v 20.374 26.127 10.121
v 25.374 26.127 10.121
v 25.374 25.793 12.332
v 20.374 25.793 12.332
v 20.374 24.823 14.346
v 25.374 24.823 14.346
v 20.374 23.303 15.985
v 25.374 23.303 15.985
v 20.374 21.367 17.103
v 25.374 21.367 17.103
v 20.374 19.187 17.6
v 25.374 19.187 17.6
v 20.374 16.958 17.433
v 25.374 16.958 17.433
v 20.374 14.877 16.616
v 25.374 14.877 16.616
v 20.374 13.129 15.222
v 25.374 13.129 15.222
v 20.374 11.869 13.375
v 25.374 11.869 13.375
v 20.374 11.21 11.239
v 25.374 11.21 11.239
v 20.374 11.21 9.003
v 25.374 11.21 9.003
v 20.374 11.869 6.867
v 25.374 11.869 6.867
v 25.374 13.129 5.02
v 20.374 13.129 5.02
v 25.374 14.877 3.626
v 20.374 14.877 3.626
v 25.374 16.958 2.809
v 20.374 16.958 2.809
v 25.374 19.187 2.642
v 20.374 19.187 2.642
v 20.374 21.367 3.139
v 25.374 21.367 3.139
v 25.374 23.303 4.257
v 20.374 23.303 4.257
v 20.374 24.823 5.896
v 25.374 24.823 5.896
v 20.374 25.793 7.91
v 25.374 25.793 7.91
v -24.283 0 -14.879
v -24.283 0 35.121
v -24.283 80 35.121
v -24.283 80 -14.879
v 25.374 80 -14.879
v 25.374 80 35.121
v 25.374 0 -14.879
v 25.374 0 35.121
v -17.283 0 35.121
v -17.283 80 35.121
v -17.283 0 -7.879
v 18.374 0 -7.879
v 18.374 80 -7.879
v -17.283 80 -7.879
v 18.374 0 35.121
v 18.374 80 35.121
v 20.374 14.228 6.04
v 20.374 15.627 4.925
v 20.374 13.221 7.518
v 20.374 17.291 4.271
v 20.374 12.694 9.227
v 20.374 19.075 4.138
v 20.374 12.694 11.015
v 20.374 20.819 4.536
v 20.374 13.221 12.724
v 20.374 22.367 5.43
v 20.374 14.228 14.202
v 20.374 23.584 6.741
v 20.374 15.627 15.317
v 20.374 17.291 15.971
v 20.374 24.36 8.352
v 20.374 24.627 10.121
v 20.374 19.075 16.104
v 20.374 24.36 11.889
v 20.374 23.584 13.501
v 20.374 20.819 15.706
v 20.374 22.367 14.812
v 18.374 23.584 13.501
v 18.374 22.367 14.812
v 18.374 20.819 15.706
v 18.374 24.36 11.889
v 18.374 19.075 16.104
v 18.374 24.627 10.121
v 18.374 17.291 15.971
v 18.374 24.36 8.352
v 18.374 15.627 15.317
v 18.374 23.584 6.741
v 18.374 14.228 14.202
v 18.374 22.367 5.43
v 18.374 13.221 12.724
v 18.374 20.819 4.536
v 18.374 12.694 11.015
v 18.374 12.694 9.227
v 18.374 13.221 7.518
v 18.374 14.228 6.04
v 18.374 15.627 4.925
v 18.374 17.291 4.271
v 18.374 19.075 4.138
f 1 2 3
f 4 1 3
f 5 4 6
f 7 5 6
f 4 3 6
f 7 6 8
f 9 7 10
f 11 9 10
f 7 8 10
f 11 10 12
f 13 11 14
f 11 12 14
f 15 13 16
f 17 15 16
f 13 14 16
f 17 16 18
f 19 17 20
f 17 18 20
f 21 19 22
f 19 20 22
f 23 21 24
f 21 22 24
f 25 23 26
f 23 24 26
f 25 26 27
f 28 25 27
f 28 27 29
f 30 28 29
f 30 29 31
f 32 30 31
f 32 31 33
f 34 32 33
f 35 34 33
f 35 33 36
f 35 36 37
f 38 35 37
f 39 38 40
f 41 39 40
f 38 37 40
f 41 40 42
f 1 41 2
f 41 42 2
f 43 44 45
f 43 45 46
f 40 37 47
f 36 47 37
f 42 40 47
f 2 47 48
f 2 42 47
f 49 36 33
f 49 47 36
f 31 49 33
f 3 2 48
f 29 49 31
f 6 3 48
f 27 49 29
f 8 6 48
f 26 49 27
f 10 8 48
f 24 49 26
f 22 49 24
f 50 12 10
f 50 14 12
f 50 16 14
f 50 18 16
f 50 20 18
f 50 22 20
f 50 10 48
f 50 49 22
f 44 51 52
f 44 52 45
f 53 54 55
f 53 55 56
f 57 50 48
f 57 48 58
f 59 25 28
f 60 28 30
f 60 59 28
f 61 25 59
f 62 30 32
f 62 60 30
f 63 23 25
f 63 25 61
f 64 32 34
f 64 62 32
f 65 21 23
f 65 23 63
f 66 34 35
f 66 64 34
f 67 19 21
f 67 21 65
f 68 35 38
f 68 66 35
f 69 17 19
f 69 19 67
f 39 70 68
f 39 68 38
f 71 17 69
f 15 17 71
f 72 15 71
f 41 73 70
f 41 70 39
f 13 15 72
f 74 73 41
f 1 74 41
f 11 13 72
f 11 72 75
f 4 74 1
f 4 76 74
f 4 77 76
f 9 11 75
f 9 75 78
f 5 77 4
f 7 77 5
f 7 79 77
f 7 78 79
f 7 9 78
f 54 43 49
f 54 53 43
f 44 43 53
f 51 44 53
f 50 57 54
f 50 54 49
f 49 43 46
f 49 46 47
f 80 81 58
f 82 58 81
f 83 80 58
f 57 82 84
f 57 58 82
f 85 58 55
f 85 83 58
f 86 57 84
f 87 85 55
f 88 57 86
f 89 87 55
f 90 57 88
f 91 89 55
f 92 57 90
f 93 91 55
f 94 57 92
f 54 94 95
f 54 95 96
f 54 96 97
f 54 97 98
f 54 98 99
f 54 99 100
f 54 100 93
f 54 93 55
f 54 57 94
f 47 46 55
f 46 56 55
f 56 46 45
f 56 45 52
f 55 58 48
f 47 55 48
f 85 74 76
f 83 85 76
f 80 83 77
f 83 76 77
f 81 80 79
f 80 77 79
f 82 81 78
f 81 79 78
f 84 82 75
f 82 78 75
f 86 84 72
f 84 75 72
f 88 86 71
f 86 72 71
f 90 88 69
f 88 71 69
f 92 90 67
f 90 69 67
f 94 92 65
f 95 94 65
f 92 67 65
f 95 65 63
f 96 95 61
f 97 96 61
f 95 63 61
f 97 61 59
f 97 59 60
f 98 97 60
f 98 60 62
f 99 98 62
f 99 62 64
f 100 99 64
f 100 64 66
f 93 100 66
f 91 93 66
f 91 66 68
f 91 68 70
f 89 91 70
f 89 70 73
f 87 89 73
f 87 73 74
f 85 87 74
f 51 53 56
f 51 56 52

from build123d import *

# Parameters (mm, degrees)
F1_DEPTH = 80
F2_R     = 6
F3_DEPTH = 25
F2_R_2   = 7.5
F4_DEPTH = 5


with BuildPart() as f1:
    # F0 (on Front) → F1 (new body)
    with BuildSketch(Plane.XZ):
        Polygon((-17.282601, 35.120948), (-24.282601, 35.120948), (-24.282601, -14.879052), (25.373651, -14.879052), (25.373651, 35.120948), (18.373651, 35.120948), (18.373651, -7.879052), (-17.282601, -7.879052), align=None)
    extrude(amount=-F1_DEPTH)

    # F2 (on face) → F3 (cut)
    with BuildSketch(Plane.YZ.offset(25.373651)):
        with Locations((18.626541, 10.120948)):
            Circle(F2_R)
    extrude(amount=-F3_DEPTH, mode=Mode.SUBTRACT)

    # F2 (on face) → F4 (cut)
    with BuildSketch(Plane.YZ.offset(25.373651)):
        with Locations((18.626541, 10.120948)):
            Circle(F2_R_2)
        with Locations((18.626541, 10.120948)):
            Circle(F2_R, mode=Mode.SUBTRACT)
    extrude(amount=-F4_DEPTH, mode=Mode.SUBTRACT)


solid = f1.part
